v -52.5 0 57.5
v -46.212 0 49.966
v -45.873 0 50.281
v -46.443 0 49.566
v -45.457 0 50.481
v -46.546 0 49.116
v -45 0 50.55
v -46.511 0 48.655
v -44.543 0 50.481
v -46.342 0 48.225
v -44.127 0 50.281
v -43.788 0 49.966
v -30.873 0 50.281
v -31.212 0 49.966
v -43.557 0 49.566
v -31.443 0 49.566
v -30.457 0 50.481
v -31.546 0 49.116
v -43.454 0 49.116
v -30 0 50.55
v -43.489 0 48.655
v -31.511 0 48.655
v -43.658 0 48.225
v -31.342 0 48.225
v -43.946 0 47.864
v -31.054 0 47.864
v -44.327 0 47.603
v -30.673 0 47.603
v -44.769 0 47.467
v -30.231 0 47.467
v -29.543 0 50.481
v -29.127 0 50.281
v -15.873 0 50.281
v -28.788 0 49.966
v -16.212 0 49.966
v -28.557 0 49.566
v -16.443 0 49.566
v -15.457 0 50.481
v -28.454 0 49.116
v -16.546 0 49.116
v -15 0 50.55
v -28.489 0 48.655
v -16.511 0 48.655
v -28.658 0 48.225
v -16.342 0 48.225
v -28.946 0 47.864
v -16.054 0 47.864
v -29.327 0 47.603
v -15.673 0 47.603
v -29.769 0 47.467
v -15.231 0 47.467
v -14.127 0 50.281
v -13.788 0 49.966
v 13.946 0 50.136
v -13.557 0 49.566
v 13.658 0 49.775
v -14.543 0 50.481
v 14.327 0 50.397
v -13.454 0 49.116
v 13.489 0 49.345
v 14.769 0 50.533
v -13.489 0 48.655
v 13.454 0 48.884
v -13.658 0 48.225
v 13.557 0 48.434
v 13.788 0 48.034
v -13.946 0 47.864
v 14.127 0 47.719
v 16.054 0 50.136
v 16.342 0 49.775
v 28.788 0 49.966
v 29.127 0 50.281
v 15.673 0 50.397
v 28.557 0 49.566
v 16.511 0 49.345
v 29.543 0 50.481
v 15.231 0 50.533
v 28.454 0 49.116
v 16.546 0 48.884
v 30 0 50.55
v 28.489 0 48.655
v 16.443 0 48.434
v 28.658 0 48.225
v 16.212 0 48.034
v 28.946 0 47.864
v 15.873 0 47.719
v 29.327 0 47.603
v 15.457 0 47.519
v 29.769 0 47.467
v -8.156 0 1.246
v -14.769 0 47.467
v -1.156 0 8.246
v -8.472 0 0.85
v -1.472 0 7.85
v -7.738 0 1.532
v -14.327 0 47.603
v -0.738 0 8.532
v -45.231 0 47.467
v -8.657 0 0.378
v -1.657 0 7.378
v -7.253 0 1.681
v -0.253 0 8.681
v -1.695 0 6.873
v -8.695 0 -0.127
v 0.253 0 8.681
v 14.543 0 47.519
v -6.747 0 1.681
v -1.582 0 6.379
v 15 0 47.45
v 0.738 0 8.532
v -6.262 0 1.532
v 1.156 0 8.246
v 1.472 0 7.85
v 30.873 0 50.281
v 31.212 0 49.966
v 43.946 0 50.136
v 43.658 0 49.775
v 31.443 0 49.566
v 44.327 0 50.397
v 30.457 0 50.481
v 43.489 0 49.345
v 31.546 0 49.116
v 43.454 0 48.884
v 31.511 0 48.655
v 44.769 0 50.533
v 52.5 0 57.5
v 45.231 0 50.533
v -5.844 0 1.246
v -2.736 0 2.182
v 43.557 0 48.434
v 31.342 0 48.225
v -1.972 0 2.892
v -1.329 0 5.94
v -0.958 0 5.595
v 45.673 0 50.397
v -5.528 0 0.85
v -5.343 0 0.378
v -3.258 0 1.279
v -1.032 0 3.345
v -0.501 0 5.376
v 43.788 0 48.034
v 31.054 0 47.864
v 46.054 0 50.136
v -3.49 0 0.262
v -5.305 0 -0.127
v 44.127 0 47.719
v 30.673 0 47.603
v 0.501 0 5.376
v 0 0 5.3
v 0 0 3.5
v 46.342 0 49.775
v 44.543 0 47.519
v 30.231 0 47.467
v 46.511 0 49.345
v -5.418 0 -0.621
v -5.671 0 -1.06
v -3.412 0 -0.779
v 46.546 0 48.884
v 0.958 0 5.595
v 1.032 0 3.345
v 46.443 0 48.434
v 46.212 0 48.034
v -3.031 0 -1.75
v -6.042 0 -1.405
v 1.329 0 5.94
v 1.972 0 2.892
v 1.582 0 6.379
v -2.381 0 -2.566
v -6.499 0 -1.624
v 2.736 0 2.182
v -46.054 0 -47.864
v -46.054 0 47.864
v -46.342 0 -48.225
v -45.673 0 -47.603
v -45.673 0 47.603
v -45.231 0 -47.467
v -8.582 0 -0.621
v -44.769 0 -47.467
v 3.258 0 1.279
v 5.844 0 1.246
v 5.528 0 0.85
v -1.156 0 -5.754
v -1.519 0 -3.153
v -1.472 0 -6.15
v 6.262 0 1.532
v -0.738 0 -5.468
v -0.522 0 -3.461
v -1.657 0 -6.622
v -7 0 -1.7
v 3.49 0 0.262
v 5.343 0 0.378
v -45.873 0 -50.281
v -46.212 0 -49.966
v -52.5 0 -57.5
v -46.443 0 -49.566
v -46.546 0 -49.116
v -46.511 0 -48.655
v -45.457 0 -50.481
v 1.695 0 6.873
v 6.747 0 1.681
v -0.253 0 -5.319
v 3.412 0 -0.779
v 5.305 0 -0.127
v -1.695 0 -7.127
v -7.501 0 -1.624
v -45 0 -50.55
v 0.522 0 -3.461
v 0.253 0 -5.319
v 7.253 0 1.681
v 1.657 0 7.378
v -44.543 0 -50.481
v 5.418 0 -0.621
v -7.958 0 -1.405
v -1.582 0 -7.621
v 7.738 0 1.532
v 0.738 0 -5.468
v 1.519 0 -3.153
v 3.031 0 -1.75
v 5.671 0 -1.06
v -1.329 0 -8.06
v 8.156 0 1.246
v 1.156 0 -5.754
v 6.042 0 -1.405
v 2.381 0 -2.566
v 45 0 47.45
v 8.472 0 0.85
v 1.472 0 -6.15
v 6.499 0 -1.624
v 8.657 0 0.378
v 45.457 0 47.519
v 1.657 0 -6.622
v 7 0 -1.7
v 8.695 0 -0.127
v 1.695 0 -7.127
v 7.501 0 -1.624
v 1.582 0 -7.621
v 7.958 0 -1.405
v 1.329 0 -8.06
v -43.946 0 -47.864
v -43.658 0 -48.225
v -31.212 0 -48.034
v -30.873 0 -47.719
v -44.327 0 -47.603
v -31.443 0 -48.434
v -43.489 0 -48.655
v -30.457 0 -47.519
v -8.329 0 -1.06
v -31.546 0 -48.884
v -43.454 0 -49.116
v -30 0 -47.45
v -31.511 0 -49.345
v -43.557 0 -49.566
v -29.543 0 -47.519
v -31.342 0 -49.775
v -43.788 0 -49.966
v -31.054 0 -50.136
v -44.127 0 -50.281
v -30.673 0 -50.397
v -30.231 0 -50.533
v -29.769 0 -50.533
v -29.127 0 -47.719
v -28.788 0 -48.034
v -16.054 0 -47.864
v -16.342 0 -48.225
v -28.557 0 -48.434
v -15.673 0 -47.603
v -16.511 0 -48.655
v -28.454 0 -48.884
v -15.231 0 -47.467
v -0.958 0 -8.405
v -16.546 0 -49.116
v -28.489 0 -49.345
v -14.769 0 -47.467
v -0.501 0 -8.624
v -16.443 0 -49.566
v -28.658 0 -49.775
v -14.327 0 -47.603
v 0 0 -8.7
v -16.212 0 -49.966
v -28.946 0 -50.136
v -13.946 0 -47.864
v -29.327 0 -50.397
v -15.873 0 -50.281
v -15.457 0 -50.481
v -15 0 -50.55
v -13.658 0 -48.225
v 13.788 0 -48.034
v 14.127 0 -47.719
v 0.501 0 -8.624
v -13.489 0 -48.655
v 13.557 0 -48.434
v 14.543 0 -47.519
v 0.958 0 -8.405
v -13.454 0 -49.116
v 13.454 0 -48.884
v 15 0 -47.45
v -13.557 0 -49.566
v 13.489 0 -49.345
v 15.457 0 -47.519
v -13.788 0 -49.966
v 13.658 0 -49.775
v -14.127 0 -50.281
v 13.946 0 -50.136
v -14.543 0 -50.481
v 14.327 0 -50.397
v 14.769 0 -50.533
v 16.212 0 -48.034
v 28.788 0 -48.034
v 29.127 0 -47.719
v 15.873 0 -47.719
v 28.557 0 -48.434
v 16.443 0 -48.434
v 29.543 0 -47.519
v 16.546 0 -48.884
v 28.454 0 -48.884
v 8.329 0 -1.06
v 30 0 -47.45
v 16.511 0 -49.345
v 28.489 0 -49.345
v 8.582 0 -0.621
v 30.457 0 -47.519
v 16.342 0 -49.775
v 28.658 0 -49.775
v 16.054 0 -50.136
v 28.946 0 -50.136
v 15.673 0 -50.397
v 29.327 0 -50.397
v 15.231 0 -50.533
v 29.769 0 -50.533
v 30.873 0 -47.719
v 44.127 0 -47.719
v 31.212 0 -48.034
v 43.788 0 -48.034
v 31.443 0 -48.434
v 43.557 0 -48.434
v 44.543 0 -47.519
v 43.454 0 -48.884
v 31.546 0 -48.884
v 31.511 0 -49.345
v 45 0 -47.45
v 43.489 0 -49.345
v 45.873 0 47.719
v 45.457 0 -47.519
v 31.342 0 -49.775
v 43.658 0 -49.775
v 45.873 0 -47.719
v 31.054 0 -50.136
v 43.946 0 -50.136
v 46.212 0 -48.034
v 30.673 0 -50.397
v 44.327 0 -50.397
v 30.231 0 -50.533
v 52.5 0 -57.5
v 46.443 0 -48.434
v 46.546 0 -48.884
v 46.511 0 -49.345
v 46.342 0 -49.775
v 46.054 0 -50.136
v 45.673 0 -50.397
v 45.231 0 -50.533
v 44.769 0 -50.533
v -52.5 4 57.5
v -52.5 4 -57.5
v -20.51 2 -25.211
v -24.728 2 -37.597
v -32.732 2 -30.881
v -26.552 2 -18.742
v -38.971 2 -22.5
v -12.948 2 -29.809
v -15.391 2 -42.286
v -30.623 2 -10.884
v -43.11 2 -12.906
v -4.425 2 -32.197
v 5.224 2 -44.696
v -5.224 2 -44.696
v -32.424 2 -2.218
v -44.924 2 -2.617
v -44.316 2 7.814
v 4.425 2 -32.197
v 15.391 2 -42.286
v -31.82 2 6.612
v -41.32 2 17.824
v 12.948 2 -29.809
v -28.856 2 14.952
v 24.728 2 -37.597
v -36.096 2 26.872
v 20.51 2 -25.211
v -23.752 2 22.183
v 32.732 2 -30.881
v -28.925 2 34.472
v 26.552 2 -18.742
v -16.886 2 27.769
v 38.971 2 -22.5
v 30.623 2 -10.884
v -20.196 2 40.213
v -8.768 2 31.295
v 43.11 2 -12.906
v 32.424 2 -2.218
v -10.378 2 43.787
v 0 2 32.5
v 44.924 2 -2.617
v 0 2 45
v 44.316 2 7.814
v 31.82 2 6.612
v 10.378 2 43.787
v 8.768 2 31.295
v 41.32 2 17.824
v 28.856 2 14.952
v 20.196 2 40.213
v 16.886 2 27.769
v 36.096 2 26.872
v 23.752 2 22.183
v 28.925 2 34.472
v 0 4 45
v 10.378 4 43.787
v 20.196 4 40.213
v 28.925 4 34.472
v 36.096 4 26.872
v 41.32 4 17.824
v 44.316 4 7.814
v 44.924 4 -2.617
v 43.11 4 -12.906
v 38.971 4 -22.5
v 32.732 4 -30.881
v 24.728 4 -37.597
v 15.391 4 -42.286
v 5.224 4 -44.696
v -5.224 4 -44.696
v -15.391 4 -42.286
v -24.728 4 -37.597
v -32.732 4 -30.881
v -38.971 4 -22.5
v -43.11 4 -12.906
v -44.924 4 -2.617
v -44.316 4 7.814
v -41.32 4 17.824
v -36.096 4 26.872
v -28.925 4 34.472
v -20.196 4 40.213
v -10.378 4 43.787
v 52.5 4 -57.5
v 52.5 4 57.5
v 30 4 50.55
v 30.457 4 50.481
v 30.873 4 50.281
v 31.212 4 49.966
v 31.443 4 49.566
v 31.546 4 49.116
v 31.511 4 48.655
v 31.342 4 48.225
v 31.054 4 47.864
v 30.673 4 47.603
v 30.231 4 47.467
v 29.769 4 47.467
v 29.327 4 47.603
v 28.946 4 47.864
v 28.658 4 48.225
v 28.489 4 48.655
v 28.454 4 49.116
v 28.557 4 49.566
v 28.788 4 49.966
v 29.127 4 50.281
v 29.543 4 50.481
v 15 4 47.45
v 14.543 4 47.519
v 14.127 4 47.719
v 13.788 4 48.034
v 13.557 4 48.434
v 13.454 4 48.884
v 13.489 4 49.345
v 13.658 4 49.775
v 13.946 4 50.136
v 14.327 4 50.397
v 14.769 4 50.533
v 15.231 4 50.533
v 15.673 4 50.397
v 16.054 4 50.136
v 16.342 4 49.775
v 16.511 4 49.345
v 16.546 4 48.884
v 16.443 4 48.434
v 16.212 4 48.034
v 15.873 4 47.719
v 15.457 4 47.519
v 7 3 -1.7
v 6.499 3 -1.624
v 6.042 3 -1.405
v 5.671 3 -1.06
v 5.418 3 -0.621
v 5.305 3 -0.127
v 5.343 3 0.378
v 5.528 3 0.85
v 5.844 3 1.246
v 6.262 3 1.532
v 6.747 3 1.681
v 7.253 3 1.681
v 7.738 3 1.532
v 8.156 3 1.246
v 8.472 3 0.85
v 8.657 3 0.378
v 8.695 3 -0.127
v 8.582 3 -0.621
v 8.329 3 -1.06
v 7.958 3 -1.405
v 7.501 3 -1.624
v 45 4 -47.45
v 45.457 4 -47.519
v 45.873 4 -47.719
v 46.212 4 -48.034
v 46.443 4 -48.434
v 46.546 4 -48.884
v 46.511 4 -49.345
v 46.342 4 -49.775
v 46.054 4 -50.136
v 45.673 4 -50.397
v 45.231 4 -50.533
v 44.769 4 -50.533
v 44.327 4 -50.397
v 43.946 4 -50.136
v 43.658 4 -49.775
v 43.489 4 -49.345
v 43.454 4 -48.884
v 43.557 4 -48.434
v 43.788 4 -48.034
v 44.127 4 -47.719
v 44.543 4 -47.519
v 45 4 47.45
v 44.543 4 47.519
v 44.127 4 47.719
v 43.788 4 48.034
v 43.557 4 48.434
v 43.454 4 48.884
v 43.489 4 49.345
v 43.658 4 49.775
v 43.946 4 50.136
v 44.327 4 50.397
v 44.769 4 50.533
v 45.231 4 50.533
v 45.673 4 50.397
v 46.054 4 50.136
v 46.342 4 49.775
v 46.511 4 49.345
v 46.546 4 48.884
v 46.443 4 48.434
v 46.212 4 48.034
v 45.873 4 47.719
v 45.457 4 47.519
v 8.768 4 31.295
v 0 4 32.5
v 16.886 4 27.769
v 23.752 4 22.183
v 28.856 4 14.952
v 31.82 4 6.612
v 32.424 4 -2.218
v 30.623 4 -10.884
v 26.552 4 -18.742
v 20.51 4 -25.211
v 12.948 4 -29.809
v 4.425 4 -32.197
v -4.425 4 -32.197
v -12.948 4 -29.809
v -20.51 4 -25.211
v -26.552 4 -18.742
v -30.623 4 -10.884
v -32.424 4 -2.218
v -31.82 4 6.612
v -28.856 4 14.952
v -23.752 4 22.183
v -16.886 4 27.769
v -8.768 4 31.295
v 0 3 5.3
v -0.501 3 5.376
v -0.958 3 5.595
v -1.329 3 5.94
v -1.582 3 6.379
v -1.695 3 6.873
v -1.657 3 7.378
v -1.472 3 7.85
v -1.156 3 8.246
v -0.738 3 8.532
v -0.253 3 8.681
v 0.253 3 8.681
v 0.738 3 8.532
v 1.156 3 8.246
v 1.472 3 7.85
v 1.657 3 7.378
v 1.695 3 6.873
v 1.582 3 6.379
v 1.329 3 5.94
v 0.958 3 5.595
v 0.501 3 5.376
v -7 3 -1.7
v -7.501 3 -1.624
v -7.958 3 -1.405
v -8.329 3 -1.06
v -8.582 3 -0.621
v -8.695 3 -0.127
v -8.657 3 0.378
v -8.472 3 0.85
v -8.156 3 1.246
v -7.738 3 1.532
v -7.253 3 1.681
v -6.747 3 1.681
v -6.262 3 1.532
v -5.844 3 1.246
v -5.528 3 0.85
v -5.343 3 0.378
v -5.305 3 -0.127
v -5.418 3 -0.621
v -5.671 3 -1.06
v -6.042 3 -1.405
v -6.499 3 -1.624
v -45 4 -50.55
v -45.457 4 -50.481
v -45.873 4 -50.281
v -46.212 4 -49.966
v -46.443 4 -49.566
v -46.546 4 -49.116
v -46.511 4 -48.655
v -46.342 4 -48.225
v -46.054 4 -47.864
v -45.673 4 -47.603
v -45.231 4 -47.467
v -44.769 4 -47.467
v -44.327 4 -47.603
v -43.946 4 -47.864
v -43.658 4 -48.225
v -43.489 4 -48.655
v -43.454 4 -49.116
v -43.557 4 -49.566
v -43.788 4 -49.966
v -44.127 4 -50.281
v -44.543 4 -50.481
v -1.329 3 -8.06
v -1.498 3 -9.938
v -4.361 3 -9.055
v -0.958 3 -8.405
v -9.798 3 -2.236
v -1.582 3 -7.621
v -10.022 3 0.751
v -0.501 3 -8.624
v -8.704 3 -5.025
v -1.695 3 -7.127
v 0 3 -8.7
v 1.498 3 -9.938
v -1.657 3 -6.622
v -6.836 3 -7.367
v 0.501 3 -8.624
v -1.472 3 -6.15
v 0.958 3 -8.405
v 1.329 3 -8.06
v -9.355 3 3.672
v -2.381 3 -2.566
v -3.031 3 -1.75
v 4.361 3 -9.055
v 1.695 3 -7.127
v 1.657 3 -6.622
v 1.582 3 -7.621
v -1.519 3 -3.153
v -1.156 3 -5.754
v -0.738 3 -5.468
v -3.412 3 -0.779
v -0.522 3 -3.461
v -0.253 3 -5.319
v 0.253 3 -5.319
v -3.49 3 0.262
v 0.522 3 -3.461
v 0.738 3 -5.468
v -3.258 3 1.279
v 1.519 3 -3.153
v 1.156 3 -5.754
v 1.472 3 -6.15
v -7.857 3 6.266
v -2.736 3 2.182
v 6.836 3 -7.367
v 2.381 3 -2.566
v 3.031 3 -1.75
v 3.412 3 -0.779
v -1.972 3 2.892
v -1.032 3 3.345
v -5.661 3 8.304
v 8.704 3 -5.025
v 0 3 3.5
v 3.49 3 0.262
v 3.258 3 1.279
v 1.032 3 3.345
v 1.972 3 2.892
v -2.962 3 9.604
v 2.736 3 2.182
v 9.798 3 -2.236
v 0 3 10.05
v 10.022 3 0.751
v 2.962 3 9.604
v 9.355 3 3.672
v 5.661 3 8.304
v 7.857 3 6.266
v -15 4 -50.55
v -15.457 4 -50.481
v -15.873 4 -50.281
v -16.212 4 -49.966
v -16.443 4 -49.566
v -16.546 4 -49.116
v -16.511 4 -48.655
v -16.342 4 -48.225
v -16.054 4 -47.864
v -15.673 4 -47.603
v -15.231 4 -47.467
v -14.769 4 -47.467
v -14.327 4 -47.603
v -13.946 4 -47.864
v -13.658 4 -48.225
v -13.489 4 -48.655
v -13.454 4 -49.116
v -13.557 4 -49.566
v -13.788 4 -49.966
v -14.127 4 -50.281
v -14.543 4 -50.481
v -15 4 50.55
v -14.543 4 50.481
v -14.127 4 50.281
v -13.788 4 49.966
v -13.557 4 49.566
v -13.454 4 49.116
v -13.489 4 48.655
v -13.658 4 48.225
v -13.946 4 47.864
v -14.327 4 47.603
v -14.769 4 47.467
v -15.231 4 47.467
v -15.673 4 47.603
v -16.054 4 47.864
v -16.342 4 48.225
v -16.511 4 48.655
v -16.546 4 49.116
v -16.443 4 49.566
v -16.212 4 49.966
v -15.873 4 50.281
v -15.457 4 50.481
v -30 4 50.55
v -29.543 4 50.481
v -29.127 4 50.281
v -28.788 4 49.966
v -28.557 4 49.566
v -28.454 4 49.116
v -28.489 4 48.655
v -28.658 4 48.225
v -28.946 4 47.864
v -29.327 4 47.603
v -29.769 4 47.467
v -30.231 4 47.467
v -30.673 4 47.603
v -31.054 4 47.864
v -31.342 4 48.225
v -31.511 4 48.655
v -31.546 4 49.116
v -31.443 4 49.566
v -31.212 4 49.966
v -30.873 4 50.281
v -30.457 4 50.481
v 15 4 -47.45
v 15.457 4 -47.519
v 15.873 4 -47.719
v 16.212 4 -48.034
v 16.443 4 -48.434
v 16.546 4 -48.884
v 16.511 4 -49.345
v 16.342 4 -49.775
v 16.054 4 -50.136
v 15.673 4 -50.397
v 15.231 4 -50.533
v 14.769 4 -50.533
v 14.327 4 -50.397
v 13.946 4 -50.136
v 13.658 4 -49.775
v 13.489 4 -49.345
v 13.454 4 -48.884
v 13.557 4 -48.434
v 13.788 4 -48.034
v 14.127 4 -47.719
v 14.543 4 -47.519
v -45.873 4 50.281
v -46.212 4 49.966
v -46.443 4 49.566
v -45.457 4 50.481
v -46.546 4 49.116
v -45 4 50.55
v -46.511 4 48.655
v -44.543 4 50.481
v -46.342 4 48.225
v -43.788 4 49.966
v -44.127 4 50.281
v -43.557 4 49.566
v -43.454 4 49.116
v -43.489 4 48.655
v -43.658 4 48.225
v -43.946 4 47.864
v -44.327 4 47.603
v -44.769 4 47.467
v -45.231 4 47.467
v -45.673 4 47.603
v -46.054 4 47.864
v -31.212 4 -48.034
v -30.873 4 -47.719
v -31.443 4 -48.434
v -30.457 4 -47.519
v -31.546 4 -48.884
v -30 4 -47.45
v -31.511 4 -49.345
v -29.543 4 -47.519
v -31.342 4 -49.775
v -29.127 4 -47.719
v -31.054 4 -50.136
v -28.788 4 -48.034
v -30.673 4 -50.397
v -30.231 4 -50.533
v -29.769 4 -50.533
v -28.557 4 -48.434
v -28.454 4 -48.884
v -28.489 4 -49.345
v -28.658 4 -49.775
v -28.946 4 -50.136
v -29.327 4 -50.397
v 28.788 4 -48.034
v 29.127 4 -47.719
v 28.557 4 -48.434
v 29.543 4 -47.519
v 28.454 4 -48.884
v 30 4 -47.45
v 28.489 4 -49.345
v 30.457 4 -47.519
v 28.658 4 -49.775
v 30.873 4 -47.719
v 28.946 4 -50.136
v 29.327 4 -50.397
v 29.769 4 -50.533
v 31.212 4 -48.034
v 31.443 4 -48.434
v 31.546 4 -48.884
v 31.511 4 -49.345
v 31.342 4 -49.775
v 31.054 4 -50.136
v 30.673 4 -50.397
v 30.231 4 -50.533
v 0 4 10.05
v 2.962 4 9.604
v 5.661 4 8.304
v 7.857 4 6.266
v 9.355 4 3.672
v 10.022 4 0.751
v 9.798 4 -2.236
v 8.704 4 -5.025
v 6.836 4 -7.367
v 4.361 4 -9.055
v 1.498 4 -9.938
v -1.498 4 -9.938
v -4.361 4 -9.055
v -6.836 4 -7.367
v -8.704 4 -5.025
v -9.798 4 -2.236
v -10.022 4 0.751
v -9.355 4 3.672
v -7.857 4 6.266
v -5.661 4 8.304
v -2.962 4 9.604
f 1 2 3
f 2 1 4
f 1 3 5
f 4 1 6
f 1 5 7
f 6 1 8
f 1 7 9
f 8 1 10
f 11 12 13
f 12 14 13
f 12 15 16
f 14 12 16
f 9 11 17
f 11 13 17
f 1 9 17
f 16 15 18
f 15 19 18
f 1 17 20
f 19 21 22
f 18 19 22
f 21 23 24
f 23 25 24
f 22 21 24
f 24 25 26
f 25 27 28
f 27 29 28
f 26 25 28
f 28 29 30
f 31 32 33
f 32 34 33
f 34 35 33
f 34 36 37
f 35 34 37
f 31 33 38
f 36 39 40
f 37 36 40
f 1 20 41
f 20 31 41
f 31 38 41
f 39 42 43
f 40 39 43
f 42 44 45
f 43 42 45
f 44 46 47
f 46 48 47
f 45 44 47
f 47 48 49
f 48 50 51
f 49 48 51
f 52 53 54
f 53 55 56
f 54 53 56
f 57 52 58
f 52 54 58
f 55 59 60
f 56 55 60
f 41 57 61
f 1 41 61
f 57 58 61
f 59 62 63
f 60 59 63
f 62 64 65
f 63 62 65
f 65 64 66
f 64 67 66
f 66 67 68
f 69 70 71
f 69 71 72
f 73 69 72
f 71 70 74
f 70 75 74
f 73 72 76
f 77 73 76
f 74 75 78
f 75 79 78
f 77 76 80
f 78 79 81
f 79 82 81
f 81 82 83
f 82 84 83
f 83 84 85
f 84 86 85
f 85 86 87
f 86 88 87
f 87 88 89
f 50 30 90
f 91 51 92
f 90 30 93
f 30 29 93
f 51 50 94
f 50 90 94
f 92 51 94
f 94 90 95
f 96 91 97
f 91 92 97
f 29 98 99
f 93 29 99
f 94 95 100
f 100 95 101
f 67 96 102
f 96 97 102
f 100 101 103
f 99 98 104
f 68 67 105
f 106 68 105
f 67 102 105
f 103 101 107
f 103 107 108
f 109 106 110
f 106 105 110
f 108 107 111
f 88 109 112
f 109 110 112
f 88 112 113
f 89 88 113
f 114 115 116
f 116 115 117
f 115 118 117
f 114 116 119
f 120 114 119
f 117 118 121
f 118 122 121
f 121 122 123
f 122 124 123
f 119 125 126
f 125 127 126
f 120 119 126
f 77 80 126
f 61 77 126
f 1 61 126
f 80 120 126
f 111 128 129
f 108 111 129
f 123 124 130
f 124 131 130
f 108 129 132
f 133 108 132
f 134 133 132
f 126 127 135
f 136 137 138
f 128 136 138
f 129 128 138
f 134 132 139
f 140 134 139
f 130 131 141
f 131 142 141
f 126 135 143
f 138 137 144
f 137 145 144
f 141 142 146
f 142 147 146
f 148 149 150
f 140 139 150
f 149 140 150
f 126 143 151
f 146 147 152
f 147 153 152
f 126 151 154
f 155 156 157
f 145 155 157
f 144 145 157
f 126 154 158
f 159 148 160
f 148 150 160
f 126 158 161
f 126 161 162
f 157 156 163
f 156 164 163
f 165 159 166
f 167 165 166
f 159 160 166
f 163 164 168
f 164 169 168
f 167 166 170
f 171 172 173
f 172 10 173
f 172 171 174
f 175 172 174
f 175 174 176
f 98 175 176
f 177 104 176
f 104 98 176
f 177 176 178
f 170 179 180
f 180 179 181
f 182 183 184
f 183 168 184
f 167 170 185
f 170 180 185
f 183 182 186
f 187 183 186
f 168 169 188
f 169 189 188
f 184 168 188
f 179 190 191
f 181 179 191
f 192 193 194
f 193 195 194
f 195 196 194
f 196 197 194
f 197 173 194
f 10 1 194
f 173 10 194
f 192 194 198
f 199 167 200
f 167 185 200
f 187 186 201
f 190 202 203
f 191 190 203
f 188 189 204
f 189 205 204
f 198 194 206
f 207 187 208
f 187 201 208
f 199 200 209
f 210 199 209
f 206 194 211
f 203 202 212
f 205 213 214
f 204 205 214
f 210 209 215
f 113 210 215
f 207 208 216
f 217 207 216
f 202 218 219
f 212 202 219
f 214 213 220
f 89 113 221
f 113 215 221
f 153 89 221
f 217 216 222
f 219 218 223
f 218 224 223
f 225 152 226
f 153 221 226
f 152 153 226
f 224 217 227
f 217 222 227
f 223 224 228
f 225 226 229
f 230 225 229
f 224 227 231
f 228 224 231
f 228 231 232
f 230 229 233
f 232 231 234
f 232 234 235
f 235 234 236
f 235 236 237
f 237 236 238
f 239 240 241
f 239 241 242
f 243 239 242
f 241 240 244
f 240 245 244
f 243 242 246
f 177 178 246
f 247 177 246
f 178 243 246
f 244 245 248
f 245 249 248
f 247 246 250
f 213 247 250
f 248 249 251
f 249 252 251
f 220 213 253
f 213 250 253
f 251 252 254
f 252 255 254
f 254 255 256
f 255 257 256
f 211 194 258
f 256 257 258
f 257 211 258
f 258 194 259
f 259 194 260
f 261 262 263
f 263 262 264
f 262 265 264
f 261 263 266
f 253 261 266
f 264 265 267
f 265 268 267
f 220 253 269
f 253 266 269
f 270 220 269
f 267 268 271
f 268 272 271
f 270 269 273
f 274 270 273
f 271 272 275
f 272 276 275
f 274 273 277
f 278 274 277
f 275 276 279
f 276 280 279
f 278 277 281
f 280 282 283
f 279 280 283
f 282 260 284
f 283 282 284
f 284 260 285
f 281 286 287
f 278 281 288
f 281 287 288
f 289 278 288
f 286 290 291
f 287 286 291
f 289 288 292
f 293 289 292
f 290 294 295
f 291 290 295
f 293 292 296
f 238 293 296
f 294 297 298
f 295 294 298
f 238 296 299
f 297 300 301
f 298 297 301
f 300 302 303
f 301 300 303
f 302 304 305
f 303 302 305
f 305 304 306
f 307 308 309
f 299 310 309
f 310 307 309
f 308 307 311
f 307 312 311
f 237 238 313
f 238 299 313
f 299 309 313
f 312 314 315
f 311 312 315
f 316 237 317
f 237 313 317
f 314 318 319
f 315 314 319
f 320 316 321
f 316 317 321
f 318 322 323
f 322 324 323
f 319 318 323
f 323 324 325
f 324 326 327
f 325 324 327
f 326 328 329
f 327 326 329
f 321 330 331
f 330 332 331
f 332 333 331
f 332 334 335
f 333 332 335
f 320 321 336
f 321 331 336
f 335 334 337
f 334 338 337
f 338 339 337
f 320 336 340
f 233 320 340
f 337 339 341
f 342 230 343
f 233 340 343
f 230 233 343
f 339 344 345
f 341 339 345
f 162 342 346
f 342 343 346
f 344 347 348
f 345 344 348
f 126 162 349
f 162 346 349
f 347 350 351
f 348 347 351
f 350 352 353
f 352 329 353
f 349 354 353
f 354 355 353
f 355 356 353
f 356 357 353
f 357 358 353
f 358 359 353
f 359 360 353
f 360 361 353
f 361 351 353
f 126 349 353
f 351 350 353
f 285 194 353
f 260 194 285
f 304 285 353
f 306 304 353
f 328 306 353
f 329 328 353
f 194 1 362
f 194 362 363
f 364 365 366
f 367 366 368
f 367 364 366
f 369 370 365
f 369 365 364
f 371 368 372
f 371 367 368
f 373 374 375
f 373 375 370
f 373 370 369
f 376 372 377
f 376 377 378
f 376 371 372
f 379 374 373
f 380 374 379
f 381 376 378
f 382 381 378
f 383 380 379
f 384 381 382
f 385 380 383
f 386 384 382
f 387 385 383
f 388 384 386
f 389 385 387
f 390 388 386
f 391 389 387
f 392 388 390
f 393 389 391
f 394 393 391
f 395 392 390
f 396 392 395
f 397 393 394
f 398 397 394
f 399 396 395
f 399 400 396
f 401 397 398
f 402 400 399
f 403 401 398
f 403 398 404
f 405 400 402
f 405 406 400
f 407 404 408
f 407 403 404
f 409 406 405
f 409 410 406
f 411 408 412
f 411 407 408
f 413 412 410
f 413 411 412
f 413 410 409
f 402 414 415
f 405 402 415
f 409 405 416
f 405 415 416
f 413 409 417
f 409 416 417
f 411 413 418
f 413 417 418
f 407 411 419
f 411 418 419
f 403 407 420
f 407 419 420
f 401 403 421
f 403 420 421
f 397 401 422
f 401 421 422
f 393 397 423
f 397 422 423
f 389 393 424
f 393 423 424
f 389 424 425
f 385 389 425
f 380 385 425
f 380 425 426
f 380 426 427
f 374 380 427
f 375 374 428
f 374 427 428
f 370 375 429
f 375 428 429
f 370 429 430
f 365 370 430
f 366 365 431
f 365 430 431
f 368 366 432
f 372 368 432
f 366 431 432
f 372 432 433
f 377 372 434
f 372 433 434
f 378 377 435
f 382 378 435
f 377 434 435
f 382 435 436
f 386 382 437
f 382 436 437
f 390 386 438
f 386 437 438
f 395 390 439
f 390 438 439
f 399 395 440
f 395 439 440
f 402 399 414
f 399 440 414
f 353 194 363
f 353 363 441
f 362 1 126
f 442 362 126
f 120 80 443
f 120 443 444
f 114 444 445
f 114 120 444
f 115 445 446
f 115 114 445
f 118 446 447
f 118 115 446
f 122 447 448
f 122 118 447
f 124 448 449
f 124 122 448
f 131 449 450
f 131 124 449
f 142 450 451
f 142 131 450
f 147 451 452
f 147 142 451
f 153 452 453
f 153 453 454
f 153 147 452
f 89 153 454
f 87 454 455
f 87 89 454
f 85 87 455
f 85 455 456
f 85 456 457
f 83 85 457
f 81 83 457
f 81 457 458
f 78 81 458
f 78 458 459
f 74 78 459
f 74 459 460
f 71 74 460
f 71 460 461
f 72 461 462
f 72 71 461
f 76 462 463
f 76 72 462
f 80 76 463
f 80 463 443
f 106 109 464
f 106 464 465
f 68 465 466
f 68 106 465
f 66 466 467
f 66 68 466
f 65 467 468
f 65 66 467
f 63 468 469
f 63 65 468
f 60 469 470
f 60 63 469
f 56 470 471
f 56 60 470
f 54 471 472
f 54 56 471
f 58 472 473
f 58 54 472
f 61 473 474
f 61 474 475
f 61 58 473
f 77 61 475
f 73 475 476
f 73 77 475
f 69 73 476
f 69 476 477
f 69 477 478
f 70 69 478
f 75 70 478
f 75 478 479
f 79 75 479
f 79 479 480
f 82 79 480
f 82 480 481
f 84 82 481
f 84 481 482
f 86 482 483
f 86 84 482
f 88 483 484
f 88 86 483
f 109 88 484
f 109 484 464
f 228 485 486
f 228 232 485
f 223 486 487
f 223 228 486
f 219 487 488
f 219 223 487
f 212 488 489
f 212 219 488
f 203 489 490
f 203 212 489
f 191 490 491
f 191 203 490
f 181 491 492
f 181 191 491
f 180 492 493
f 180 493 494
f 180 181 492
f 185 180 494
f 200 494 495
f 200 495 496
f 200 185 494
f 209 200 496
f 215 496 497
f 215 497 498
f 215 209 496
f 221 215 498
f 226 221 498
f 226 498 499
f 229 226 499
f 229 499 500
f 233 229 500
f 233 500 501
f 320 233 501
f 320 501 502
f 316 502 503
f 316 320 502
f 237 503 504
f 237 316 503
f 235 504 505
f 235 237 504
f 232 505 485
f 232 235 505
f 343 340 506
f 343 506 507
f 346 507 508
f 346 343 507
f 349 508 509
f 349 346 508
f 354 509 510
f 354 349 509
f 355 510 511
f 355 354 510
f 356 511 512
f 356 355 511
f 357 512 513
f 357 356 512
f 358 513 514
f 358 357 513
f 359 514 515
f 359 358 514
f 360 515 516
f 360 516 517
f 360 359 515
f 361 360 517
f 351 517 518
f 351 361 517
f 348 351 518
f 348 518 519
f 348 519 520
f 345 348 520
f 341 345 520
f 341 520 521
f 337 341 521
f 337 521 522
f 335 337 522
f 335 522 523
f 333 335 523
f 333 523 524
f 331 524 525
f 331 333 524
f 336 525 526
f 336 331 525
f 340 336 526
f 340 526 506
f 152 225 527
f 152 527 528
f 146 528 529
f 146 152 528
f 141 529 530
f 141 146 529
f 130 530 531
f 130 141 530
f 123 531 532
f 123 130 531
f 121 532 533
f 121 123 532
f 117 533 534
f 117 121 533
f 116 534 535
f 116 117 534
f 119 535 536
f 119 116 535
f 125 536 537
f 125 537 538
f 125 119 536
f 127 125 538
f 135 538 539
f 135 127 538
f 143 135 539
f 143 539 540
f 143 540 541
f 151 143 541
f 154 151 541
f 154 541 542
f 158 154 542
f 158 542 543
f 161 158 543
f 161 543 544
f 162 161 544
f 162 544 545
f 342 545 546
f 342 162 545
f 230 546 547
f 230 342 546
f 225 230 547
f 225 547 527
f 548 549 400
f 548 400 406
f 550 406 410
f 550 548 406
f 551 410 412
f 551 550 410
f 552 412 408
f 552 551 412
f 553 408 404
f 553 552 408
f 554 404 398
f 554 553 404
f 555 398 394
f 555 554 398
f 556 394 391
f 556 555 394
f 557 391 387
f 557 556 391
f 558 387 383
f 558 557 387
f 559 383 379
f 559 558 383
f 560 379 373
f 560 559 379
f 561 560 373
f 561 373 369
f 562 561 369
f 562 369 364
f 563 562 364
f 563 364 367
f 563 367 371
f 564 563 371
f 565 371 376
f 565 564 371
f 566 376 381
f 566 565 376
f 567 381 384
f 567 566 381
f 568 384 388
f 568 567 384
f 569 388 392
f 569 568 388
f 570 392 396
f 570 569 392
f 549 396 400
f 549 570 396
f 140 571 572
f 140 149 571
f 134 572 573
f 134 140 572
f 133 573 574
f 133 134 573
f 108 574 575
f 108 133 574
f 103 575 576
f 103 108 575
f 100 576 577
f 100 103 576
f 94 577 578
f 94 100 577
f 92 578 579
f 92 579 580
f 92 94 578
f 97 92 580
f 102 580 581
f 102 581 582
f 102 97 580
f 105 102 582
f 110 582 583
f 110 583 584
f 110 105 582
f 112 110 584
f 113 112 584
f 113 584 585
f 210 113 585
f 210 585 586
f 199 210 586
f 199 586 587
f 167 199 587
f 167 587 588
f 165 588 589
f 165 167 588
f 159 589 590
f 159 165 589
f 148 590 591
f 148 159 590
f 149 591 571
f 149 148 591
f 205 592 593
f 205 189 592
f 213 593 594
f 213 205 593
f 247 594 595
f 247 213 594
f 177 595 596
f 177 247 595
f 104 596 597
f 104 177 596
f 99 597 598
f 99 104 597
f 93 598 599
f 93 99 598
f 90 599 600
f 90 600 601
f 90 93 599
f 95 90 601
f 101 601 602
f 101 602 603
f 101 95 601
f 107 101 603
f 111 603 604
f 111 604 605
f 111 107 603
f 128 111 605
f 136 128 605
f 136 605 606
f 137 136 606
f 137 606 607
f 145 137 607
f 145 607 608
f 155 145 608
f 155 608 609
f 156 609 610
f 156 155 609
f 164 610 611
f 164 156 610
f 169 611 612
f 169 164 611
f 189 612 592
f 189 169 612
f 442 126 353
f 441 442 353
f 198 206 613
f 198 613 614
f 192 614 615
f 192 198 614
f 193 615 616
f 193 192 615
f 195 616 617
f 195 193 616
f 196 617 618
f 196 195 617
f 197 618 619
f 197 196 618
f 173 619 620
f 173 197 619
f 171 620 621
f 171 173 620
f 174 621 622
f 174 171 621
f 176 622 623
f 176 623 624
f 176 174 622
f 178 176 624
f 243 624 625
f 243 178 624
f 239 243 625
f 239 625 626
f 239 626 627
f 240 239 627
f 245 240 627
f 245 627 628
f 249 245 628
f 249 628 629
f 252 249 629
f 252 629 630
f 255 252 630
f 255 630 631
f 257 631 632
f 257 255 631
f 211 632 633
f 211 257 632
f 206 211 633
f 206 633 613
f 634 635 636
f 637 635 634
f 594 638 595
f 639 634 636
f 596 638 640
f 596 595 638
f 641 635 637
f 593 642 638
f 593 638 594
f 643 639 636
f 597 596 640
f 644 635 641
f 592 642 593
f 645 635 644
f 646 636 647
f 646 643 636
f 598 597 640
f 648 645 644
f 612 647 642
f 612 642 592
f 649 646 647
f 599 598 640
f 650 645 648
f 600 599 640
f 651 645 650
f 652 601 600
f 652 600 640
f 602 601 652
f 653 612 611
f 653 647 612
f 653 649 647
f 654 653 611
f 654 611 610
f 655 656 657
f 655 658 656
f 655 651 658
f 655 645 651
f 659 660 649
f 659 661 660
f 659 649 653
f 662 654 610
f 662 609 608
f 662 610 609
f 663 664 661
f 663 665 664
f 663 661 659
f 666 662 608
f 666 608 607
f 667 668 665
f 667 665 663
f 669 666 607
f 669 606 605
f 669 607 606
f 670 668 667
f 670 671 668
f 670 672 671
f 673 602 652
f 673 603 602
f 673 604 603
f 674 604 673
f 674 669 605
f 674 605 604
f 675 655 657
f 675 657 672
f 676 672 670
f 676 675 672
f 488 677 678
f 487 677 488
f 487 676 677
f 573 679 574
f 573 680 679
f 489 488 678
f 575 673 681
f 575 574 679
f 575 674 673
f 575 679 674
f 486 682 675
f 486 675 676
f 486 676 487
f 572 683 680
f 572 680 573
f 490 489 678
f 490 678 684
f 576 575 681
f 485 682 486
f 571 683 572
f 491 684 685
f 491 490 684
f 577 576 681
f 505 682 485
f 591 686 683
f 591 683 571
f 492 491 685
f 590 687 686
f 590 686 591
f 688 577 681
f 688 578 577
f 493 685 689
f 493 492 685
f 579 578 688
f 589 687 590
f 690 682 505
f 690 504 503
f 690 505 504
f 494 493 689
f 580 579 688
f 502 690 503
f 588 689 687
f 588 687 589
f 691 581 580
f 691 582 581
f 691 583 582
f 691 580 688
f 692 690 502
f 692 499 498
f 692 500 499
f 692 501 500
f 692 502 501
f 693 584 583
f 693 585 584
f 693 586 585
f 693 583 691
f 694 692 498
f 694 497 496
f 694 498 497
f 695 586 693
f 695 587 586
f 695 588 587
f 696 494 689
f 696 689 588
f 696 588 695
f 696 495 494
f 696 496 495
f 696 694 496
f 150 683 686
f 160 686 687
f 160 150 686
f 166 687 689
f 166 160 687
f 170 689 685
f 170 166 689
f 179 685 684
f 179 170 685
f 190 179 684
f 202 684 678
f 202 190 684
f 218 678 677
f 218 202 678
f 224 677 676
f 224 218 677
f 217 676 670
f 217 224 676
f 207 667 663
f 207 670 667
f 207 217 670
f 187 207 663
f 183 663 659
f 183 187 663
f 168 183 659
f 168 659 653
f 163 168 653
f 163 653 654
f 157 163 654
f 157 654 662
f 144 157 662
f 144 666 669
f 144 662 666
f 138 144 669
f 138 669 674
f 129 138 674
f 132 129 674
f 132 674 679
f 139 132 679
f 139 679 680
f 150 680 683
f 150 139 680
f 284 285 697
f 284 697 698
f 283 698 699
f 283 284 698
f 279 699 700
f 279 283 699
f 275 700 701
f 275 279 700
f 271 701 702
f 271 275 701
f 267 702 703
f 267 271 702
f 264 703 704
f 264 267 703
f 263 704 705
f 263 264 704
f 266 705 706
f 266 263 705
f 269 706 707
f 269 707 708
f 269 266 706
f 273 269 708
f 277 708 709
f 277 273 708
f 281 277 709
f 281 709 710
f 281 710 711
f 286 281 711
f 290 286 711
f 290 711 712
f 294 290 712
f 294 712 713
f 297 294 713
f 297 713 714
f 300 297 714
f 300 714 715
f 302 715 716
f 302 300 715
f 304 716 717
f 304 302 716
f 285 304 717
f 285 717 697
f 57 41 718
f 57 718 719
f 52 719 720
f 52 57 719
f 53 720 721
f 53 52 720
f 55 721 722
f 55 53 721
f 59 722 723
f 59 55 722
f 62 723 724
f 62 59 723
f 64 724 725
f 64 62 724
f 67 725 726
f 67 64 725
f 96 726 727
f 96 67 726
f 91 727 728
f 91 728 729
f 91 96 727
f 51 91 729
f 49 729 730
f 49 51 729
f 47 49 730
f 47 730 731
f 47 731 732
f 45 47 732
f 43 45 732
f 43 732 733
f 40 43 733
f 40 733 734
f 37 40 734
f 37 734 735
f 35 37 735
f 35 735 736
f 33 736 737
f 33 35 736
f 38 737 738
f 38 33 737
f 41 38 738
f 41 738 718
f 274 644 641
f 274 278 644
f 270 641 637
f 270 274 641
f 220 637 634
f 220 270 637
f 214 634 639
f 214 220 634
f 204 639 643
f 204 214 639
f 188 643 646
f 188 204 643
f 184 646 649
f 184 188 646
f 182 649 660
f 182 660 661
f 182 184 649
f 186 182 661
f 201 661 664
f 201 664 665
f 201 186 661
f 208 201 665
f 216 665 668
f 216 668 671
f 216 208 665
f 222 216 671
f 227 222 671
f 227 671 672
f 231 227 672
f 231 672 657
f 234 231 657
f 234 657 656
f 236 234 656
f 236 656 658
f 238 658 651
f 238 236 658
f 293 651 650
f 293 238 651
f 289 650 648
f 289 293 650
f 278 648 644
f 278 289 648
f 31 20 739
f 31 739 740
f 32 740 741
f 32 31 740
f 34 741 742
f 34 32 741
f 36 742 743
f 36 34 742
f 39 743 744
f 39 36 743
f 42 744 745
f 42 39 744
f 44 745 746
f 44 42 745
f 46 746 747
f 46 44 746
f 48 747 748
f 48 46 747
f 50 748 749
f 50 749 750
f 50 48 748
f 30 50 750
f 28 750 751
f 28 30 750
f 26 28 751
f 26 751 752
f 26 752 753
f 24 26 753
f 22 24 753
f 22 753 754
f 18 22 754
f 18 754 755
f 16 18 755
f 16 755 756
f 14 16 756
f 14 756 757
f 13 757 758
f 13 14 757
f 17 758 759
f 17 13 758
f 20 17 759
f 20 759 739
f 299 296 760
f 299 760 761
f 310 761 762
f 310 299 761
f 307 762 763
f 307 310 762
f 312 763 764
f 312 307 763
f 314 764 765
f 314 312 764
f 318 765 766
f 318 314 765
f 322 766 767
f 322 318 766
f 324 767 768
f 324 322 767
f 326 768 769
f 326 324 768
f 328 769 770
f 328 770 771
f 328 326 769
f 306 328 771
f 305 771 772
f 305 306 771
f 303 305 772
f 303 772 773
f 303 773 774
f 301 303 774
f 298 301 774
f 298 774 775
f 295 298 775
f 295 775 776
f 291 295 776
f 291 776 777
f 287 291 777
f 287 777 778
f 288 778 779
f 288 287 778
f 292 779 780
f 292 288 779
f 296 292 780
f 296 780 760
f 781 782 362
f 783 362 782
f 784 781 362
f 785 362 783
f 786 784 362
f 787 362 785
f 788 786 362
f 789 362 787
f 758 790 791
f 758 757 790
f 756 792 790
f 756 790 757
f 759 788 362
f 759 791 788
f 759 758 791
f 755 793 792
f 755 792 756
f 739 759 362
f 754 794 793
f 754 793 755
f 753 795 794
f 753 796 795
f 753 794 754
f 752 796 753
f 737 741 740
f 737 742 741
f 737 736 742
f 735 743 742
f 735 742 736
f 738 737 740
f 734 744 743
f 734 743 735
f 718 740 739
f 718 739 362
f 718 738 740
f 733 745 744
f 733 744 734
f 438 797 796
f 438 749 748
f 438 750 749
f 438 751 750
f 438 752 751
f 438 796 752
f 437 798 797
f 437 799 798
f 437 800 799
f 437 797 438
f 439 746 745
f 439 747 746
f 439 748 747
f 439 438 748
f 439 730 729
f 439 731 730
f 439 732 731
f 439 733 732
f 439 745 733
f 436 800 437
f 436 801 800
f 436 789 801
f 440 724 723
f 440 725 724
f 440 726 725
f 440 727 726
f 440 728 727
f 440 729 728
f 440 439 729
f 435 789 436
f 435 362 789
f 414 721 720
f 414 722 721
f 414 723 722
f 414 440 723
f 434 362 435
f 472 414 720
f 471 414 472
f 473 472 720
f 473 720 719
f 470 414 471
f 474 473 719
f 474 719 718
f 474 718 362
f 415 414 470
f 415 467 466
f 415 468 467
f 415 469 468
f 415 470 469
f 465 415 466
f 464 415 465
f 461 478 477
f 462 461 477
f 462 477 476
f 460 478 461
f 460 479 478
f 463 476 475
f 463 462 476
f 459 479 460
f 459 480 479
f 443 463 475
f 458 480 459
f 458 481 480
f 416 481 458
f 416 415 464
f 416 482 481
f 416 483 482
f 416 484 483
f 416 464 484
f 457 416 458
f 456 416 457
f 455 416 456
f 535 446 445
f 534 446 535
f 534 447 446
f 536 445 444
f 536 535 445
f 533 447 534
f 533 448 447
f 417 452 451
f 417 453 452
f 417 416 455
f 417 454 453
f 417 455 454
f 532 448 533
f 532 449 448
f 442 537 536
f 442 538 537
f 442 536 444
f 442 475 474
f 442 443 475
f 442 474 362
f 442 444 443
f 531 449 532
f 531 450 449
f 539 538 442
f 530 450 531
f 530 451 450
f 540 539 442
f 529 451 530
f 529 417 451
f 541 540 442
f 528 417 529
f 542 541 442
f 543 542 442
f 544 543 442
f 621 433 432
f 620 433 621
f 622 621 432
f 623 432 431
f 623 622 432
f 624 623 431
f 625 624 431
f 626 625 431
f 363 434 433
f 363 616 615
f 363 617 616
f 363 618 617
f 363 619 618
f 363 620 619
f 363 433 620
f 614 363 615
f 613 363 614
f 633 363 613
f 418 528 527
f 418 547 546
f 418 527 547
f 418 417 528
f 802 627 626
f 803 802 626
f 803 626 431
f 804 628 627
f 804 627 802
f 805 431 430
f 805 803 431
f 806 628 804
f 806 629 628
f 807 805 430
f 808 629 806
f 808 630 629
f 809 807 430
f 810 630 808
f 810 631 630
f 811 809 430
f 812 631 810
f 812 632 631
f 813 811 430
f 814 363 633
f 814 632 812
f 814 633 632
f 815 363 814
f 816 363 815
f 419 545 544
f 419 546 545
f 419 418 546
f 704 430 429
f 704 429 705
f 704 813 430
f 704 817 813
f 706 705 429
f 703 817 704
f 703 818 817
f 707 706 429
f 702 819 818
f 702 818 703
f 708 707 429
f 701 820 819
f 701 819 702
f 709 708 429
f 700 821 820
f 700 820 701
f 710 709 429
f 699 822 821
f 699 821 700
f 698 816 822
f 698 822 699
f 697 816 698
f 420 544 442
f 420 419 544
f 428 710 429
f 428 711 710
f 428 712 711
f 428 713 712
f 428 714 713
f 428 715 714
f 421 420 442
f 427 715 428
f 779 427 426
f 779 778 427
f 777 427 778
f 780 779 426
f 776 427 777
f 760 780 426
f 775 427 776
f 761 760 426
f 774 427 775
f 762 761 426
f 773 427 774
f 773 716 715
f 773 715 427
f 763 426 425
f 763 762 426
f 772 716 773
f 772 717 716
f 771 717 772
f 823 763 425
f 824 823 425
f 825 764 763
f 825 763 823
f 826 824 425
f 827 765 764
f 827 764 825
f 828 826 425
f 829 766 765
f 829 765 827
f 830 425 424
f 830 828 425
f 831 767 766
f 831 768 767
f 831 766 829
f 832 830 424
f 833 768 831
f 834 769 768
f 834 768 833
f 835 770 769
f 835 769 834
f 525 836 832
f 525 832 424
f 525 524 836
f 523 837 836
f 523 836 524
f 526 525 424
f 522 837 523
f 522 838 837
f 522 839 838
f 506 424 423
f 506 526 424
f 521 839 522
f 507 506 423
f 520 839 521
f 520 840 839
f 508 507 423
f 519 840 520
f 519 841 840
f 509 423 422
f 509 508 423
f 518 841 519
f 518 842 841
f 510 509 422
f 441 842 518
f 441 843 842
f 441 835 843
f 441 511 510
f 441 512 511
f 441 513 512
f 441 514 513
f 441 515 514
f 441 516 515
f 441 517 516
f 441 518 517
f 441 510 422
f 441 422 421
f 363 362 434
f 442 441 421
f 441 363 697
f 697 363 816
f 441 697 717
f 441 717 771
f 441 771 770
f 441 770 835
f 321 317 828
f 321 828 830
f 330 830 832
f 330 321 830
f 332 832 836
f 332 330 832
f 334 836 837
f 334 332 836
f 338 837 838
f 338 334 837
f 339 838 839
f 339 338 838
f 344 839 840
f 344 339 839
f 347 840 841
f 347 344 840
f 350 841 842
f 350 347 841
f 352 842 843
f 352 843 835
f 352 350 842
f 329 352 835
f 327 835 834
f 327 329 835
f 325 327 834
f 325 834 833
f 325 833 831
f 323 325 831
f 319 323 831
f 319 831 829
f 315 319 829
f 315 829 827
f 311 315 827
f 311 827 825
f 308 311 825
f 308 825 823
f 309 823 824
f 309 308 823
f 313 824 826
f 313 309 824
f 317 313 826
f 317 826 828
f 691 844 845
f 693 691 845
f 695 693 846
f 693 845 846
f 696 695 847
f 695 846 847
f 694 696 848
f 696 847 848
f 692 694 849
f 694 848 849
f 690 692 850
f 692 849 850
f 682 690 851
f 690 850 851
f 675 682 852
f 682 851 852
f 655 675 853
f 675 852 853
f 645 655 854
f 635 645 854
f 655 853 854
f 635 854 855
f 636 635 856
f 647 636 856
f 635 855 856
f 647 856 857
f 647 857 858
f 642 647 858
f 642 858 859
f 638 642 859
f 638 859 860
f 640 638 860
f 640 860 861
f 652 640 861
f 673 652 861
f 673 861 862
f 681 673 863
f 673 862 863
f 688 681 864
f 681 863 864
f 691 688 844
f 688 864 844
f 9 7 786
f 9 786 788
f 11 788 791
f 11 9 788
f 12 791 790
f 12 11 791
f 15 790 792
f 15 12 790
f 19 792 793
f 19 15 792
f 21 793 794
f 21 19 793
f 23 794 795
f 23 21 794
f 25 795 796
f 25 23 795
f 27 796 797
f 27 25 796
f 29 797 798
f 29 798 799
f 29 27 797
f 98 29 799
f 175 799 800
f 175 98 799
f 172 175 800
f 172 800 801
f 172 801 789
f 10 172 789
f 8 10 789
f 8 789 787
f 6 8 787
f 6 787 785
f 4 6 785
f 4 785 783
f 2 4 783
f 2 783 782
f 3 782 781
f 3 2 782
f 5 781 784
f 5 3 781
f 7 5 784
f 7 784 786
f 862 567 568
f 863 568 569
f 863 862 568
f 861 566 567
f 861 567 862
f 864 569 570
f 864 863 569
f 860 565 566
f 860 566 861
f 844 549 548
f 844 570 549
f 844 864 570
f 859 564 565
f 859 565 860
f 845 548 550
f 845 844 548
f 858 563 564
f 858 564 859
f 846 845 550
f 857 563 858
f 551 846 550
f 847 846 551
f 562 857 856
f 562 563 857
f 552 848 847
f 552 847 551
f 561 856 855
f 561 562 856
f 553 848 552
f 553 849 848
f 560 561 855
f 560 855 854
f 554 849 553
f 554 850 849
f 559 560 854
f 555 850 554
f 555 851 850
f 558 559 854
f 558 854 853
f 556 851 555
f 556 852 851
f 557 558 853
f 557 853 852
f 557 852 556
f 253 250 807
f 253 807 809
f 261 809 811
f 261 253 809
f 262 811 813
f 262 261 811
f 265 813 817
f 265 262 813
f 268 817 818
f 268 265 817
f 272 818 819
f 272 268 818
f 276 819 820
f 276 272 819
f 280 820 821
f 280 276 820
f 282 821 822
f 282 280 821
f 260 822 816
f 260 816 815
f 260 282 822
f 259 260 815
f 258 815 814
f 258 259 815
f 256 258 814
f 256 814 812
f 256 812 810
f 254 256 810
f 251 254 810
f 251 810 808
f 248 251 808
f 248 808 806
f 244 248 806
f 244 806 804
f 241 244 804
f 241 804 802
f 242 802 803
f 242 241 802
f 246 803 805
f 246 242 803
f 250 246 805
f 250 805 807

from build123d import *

# Parameters (mm, degrees)
SKETCH_1_W               = 105
SKETCH_1_H               = 115
SKETCH_1_R               = 3.5
SKETCH_1_R_2             = 1.55
EXTRUDE_1_DEPTH          = 4
SKETCH_2_R               = 45
SKETCH_2_R_2             = 32.5
CUT_EXTRUDE_1_DEPTH      = 2
SKETCH_3_R               = 10.05
SKETCH_3_R_2             = 1.7
CUT_EXTRUDE_2_DEPTH      = 1
CUT_EXTRUDE_5_DEPTH      = 20
CUT_EXTRUDE_5_DEPTH_BACK = 20
SKETCH_4_R               = 1.7


with BuildPart() as part:
    # 草图1 → 凸台-拉伸1 (new body)
    with BuildSketch(Plane(origin=(0, 0, 0), x_dir=(1, 0, 0), z_dir=(0, 1, 0))):
        Rectangle(SKETCH_1_W, SKETCH_1_H)
        with Locations(Location((0, 0, 0), (0, 0, 270))):
            Circle(SKETCH_1_R, mode=Mode.SUBTRACT)
        with Locations(Location((45, 49, 0), (0, 0, 270))):
            Circle(SKETCH_1_R_2, mode=Mode.SUBTRACT)
        with Locations(Location((45, -49, 0), (0, 0, 90))):
            Circle(SKETCH_1_R_2, mode=Mode.SUBTRACT)
        with Locations(Location((-45, -49, 0), (0, 0, 270))):
            Circle(SKETCH_1_R_2, mode=Mode.SUBTRACT)
        with Locations(Location((-45, 49, 0), (0, 0, 90))):
            Circle(SKETCH_1_R_2, mode=Mode.SUBTRACT)
        with Locations(Location((-15, -49, 0), (0, 0, 270))):
            Circle(SKETCH_1_R_2, mode=Mode.SUBTRACT)
        with Locations(Location((15, -49, 0), (0, 0, 90))):
            Circle(SKETCH_1_R_2, mode=Mode.SUBTRACT)
        with Locations(Location((15, 49, 0), (0, 0, 270))):
            Circle(SKETCH_1_R_2, mode=Mode.SUBTRACT)
        with Locations(Location((-15, 49, 0), (0, 0, 90))):
            Circle(SKETCH_1_R_2, mode=Mode.SUBTRACT)
        with Locations(Location((30, 49, 0), (0, 0, 270))):
            Circle(SKETCH_1_R_2, mode=Mode.SUBTRACT)
        with Locations(Location((-30, 49, 0), (0, 0, 270))):
            Circle(SKETCH_1_R_2, mode=Mode.SUBTRACT)
        with Locations(Location((-30, -49, 0), (0, 0, 270))):
            Circle(SKETCH_1_R_2, mode=Mode.SUBTRACT)
        with Locations(Location((30, -49, 0), (0, 0, 270))):
            Circle(SKETCH_1_R_2, mode=Mode.SUBTRACT)
    extrude(amount=EXTRUDE_1_DEPTH)

    # 草图2 → 切除-拉伸1 (cut)
    with BuildSketch(Plane(origin=(0, 4, 0), x_dir=(1, 0, 0), z_dir=(0, 1, 0))):
        with Locations(Location((0, 0, 0), (0, 0, 270))):
            Circle(SKETCH_2_R)
        with Locations(Location((0, 0, 0), (0, 0, 270))):
            Circle(SKETCH_2_R_2, mode=Mode.SUBTRACT)
    extrude(amount=-CUT_EXTRUDE_1_DEPTH, mode=Mode.SUBTRACT)

    # 草图3 → 切除-拉伸2 (cut)
    with BuildSketch(Plane(origin=(0, 4, 0), x_dir=(1, 0, 0), z_dir=(0, 1, 0))):
        with Locations(Location((0, 0, 0), (0, 0, 270))):
            Circle(SKETCH_3_R)
        with Locations(Location((0, 7, 0), (0, 0, 270))):
            Circle(SKETCH_3_R_2, mode=Mode.SUBTRACT)
        with Locations(Location((7, 0, 0), (0, 0, 270))):
            Circle(SKETCH_3_R_2, mode=Mode.SUBTRACT)
        with Locations(Location((0, -7, 0), (0, 0, 270))):
            Circle(SKETCH_3_R_2, mode=Mode.SUBTRACT)
        with Locations(Location((-7, 0, 0), (0, 0, 270))):
            Circle(SKETCH_3_R_2, mode=Mode.SUBTRACT)
    extrude(amount=-CUT_EXTRUDE_2_DEPTH, mode=Mode.SUBTRACT)

    # 草图4 → 切除-拉伸5 (cut, two sides: drawn at the far end of the back side and taken through both)
    with BuildSketch(Plane(origin=(0, 3, 0), x_dir=(1, 0, 0), z_dir=(0, 1, 0)).offset(-CUT_EXTRUDE_5_DEPTH_BACK)):
        with Locations(Location((7, 0, 0), (0, 0, 90))):
            Circle(SKETCH_4_R)
        with Locations(Location((0, 7, 0), (0, 0, 90))):
            Circle(SKETCH_4_R)
        with Locations(Location((0, -7, 0), (0, 0, 90))):
            Circle(SKETCH_4_R)
        with Locations(Location((-7, 0, 0), (0, 0, 90))):
            Circle(SKETCH_4_R)
    extrude(amount=CUT_EXTRUDE_5_DEPTH + CUT_EXTRUDE_5_DEPTH_BACK, mode=Mode.SUBTRACT)


solid = part.part
